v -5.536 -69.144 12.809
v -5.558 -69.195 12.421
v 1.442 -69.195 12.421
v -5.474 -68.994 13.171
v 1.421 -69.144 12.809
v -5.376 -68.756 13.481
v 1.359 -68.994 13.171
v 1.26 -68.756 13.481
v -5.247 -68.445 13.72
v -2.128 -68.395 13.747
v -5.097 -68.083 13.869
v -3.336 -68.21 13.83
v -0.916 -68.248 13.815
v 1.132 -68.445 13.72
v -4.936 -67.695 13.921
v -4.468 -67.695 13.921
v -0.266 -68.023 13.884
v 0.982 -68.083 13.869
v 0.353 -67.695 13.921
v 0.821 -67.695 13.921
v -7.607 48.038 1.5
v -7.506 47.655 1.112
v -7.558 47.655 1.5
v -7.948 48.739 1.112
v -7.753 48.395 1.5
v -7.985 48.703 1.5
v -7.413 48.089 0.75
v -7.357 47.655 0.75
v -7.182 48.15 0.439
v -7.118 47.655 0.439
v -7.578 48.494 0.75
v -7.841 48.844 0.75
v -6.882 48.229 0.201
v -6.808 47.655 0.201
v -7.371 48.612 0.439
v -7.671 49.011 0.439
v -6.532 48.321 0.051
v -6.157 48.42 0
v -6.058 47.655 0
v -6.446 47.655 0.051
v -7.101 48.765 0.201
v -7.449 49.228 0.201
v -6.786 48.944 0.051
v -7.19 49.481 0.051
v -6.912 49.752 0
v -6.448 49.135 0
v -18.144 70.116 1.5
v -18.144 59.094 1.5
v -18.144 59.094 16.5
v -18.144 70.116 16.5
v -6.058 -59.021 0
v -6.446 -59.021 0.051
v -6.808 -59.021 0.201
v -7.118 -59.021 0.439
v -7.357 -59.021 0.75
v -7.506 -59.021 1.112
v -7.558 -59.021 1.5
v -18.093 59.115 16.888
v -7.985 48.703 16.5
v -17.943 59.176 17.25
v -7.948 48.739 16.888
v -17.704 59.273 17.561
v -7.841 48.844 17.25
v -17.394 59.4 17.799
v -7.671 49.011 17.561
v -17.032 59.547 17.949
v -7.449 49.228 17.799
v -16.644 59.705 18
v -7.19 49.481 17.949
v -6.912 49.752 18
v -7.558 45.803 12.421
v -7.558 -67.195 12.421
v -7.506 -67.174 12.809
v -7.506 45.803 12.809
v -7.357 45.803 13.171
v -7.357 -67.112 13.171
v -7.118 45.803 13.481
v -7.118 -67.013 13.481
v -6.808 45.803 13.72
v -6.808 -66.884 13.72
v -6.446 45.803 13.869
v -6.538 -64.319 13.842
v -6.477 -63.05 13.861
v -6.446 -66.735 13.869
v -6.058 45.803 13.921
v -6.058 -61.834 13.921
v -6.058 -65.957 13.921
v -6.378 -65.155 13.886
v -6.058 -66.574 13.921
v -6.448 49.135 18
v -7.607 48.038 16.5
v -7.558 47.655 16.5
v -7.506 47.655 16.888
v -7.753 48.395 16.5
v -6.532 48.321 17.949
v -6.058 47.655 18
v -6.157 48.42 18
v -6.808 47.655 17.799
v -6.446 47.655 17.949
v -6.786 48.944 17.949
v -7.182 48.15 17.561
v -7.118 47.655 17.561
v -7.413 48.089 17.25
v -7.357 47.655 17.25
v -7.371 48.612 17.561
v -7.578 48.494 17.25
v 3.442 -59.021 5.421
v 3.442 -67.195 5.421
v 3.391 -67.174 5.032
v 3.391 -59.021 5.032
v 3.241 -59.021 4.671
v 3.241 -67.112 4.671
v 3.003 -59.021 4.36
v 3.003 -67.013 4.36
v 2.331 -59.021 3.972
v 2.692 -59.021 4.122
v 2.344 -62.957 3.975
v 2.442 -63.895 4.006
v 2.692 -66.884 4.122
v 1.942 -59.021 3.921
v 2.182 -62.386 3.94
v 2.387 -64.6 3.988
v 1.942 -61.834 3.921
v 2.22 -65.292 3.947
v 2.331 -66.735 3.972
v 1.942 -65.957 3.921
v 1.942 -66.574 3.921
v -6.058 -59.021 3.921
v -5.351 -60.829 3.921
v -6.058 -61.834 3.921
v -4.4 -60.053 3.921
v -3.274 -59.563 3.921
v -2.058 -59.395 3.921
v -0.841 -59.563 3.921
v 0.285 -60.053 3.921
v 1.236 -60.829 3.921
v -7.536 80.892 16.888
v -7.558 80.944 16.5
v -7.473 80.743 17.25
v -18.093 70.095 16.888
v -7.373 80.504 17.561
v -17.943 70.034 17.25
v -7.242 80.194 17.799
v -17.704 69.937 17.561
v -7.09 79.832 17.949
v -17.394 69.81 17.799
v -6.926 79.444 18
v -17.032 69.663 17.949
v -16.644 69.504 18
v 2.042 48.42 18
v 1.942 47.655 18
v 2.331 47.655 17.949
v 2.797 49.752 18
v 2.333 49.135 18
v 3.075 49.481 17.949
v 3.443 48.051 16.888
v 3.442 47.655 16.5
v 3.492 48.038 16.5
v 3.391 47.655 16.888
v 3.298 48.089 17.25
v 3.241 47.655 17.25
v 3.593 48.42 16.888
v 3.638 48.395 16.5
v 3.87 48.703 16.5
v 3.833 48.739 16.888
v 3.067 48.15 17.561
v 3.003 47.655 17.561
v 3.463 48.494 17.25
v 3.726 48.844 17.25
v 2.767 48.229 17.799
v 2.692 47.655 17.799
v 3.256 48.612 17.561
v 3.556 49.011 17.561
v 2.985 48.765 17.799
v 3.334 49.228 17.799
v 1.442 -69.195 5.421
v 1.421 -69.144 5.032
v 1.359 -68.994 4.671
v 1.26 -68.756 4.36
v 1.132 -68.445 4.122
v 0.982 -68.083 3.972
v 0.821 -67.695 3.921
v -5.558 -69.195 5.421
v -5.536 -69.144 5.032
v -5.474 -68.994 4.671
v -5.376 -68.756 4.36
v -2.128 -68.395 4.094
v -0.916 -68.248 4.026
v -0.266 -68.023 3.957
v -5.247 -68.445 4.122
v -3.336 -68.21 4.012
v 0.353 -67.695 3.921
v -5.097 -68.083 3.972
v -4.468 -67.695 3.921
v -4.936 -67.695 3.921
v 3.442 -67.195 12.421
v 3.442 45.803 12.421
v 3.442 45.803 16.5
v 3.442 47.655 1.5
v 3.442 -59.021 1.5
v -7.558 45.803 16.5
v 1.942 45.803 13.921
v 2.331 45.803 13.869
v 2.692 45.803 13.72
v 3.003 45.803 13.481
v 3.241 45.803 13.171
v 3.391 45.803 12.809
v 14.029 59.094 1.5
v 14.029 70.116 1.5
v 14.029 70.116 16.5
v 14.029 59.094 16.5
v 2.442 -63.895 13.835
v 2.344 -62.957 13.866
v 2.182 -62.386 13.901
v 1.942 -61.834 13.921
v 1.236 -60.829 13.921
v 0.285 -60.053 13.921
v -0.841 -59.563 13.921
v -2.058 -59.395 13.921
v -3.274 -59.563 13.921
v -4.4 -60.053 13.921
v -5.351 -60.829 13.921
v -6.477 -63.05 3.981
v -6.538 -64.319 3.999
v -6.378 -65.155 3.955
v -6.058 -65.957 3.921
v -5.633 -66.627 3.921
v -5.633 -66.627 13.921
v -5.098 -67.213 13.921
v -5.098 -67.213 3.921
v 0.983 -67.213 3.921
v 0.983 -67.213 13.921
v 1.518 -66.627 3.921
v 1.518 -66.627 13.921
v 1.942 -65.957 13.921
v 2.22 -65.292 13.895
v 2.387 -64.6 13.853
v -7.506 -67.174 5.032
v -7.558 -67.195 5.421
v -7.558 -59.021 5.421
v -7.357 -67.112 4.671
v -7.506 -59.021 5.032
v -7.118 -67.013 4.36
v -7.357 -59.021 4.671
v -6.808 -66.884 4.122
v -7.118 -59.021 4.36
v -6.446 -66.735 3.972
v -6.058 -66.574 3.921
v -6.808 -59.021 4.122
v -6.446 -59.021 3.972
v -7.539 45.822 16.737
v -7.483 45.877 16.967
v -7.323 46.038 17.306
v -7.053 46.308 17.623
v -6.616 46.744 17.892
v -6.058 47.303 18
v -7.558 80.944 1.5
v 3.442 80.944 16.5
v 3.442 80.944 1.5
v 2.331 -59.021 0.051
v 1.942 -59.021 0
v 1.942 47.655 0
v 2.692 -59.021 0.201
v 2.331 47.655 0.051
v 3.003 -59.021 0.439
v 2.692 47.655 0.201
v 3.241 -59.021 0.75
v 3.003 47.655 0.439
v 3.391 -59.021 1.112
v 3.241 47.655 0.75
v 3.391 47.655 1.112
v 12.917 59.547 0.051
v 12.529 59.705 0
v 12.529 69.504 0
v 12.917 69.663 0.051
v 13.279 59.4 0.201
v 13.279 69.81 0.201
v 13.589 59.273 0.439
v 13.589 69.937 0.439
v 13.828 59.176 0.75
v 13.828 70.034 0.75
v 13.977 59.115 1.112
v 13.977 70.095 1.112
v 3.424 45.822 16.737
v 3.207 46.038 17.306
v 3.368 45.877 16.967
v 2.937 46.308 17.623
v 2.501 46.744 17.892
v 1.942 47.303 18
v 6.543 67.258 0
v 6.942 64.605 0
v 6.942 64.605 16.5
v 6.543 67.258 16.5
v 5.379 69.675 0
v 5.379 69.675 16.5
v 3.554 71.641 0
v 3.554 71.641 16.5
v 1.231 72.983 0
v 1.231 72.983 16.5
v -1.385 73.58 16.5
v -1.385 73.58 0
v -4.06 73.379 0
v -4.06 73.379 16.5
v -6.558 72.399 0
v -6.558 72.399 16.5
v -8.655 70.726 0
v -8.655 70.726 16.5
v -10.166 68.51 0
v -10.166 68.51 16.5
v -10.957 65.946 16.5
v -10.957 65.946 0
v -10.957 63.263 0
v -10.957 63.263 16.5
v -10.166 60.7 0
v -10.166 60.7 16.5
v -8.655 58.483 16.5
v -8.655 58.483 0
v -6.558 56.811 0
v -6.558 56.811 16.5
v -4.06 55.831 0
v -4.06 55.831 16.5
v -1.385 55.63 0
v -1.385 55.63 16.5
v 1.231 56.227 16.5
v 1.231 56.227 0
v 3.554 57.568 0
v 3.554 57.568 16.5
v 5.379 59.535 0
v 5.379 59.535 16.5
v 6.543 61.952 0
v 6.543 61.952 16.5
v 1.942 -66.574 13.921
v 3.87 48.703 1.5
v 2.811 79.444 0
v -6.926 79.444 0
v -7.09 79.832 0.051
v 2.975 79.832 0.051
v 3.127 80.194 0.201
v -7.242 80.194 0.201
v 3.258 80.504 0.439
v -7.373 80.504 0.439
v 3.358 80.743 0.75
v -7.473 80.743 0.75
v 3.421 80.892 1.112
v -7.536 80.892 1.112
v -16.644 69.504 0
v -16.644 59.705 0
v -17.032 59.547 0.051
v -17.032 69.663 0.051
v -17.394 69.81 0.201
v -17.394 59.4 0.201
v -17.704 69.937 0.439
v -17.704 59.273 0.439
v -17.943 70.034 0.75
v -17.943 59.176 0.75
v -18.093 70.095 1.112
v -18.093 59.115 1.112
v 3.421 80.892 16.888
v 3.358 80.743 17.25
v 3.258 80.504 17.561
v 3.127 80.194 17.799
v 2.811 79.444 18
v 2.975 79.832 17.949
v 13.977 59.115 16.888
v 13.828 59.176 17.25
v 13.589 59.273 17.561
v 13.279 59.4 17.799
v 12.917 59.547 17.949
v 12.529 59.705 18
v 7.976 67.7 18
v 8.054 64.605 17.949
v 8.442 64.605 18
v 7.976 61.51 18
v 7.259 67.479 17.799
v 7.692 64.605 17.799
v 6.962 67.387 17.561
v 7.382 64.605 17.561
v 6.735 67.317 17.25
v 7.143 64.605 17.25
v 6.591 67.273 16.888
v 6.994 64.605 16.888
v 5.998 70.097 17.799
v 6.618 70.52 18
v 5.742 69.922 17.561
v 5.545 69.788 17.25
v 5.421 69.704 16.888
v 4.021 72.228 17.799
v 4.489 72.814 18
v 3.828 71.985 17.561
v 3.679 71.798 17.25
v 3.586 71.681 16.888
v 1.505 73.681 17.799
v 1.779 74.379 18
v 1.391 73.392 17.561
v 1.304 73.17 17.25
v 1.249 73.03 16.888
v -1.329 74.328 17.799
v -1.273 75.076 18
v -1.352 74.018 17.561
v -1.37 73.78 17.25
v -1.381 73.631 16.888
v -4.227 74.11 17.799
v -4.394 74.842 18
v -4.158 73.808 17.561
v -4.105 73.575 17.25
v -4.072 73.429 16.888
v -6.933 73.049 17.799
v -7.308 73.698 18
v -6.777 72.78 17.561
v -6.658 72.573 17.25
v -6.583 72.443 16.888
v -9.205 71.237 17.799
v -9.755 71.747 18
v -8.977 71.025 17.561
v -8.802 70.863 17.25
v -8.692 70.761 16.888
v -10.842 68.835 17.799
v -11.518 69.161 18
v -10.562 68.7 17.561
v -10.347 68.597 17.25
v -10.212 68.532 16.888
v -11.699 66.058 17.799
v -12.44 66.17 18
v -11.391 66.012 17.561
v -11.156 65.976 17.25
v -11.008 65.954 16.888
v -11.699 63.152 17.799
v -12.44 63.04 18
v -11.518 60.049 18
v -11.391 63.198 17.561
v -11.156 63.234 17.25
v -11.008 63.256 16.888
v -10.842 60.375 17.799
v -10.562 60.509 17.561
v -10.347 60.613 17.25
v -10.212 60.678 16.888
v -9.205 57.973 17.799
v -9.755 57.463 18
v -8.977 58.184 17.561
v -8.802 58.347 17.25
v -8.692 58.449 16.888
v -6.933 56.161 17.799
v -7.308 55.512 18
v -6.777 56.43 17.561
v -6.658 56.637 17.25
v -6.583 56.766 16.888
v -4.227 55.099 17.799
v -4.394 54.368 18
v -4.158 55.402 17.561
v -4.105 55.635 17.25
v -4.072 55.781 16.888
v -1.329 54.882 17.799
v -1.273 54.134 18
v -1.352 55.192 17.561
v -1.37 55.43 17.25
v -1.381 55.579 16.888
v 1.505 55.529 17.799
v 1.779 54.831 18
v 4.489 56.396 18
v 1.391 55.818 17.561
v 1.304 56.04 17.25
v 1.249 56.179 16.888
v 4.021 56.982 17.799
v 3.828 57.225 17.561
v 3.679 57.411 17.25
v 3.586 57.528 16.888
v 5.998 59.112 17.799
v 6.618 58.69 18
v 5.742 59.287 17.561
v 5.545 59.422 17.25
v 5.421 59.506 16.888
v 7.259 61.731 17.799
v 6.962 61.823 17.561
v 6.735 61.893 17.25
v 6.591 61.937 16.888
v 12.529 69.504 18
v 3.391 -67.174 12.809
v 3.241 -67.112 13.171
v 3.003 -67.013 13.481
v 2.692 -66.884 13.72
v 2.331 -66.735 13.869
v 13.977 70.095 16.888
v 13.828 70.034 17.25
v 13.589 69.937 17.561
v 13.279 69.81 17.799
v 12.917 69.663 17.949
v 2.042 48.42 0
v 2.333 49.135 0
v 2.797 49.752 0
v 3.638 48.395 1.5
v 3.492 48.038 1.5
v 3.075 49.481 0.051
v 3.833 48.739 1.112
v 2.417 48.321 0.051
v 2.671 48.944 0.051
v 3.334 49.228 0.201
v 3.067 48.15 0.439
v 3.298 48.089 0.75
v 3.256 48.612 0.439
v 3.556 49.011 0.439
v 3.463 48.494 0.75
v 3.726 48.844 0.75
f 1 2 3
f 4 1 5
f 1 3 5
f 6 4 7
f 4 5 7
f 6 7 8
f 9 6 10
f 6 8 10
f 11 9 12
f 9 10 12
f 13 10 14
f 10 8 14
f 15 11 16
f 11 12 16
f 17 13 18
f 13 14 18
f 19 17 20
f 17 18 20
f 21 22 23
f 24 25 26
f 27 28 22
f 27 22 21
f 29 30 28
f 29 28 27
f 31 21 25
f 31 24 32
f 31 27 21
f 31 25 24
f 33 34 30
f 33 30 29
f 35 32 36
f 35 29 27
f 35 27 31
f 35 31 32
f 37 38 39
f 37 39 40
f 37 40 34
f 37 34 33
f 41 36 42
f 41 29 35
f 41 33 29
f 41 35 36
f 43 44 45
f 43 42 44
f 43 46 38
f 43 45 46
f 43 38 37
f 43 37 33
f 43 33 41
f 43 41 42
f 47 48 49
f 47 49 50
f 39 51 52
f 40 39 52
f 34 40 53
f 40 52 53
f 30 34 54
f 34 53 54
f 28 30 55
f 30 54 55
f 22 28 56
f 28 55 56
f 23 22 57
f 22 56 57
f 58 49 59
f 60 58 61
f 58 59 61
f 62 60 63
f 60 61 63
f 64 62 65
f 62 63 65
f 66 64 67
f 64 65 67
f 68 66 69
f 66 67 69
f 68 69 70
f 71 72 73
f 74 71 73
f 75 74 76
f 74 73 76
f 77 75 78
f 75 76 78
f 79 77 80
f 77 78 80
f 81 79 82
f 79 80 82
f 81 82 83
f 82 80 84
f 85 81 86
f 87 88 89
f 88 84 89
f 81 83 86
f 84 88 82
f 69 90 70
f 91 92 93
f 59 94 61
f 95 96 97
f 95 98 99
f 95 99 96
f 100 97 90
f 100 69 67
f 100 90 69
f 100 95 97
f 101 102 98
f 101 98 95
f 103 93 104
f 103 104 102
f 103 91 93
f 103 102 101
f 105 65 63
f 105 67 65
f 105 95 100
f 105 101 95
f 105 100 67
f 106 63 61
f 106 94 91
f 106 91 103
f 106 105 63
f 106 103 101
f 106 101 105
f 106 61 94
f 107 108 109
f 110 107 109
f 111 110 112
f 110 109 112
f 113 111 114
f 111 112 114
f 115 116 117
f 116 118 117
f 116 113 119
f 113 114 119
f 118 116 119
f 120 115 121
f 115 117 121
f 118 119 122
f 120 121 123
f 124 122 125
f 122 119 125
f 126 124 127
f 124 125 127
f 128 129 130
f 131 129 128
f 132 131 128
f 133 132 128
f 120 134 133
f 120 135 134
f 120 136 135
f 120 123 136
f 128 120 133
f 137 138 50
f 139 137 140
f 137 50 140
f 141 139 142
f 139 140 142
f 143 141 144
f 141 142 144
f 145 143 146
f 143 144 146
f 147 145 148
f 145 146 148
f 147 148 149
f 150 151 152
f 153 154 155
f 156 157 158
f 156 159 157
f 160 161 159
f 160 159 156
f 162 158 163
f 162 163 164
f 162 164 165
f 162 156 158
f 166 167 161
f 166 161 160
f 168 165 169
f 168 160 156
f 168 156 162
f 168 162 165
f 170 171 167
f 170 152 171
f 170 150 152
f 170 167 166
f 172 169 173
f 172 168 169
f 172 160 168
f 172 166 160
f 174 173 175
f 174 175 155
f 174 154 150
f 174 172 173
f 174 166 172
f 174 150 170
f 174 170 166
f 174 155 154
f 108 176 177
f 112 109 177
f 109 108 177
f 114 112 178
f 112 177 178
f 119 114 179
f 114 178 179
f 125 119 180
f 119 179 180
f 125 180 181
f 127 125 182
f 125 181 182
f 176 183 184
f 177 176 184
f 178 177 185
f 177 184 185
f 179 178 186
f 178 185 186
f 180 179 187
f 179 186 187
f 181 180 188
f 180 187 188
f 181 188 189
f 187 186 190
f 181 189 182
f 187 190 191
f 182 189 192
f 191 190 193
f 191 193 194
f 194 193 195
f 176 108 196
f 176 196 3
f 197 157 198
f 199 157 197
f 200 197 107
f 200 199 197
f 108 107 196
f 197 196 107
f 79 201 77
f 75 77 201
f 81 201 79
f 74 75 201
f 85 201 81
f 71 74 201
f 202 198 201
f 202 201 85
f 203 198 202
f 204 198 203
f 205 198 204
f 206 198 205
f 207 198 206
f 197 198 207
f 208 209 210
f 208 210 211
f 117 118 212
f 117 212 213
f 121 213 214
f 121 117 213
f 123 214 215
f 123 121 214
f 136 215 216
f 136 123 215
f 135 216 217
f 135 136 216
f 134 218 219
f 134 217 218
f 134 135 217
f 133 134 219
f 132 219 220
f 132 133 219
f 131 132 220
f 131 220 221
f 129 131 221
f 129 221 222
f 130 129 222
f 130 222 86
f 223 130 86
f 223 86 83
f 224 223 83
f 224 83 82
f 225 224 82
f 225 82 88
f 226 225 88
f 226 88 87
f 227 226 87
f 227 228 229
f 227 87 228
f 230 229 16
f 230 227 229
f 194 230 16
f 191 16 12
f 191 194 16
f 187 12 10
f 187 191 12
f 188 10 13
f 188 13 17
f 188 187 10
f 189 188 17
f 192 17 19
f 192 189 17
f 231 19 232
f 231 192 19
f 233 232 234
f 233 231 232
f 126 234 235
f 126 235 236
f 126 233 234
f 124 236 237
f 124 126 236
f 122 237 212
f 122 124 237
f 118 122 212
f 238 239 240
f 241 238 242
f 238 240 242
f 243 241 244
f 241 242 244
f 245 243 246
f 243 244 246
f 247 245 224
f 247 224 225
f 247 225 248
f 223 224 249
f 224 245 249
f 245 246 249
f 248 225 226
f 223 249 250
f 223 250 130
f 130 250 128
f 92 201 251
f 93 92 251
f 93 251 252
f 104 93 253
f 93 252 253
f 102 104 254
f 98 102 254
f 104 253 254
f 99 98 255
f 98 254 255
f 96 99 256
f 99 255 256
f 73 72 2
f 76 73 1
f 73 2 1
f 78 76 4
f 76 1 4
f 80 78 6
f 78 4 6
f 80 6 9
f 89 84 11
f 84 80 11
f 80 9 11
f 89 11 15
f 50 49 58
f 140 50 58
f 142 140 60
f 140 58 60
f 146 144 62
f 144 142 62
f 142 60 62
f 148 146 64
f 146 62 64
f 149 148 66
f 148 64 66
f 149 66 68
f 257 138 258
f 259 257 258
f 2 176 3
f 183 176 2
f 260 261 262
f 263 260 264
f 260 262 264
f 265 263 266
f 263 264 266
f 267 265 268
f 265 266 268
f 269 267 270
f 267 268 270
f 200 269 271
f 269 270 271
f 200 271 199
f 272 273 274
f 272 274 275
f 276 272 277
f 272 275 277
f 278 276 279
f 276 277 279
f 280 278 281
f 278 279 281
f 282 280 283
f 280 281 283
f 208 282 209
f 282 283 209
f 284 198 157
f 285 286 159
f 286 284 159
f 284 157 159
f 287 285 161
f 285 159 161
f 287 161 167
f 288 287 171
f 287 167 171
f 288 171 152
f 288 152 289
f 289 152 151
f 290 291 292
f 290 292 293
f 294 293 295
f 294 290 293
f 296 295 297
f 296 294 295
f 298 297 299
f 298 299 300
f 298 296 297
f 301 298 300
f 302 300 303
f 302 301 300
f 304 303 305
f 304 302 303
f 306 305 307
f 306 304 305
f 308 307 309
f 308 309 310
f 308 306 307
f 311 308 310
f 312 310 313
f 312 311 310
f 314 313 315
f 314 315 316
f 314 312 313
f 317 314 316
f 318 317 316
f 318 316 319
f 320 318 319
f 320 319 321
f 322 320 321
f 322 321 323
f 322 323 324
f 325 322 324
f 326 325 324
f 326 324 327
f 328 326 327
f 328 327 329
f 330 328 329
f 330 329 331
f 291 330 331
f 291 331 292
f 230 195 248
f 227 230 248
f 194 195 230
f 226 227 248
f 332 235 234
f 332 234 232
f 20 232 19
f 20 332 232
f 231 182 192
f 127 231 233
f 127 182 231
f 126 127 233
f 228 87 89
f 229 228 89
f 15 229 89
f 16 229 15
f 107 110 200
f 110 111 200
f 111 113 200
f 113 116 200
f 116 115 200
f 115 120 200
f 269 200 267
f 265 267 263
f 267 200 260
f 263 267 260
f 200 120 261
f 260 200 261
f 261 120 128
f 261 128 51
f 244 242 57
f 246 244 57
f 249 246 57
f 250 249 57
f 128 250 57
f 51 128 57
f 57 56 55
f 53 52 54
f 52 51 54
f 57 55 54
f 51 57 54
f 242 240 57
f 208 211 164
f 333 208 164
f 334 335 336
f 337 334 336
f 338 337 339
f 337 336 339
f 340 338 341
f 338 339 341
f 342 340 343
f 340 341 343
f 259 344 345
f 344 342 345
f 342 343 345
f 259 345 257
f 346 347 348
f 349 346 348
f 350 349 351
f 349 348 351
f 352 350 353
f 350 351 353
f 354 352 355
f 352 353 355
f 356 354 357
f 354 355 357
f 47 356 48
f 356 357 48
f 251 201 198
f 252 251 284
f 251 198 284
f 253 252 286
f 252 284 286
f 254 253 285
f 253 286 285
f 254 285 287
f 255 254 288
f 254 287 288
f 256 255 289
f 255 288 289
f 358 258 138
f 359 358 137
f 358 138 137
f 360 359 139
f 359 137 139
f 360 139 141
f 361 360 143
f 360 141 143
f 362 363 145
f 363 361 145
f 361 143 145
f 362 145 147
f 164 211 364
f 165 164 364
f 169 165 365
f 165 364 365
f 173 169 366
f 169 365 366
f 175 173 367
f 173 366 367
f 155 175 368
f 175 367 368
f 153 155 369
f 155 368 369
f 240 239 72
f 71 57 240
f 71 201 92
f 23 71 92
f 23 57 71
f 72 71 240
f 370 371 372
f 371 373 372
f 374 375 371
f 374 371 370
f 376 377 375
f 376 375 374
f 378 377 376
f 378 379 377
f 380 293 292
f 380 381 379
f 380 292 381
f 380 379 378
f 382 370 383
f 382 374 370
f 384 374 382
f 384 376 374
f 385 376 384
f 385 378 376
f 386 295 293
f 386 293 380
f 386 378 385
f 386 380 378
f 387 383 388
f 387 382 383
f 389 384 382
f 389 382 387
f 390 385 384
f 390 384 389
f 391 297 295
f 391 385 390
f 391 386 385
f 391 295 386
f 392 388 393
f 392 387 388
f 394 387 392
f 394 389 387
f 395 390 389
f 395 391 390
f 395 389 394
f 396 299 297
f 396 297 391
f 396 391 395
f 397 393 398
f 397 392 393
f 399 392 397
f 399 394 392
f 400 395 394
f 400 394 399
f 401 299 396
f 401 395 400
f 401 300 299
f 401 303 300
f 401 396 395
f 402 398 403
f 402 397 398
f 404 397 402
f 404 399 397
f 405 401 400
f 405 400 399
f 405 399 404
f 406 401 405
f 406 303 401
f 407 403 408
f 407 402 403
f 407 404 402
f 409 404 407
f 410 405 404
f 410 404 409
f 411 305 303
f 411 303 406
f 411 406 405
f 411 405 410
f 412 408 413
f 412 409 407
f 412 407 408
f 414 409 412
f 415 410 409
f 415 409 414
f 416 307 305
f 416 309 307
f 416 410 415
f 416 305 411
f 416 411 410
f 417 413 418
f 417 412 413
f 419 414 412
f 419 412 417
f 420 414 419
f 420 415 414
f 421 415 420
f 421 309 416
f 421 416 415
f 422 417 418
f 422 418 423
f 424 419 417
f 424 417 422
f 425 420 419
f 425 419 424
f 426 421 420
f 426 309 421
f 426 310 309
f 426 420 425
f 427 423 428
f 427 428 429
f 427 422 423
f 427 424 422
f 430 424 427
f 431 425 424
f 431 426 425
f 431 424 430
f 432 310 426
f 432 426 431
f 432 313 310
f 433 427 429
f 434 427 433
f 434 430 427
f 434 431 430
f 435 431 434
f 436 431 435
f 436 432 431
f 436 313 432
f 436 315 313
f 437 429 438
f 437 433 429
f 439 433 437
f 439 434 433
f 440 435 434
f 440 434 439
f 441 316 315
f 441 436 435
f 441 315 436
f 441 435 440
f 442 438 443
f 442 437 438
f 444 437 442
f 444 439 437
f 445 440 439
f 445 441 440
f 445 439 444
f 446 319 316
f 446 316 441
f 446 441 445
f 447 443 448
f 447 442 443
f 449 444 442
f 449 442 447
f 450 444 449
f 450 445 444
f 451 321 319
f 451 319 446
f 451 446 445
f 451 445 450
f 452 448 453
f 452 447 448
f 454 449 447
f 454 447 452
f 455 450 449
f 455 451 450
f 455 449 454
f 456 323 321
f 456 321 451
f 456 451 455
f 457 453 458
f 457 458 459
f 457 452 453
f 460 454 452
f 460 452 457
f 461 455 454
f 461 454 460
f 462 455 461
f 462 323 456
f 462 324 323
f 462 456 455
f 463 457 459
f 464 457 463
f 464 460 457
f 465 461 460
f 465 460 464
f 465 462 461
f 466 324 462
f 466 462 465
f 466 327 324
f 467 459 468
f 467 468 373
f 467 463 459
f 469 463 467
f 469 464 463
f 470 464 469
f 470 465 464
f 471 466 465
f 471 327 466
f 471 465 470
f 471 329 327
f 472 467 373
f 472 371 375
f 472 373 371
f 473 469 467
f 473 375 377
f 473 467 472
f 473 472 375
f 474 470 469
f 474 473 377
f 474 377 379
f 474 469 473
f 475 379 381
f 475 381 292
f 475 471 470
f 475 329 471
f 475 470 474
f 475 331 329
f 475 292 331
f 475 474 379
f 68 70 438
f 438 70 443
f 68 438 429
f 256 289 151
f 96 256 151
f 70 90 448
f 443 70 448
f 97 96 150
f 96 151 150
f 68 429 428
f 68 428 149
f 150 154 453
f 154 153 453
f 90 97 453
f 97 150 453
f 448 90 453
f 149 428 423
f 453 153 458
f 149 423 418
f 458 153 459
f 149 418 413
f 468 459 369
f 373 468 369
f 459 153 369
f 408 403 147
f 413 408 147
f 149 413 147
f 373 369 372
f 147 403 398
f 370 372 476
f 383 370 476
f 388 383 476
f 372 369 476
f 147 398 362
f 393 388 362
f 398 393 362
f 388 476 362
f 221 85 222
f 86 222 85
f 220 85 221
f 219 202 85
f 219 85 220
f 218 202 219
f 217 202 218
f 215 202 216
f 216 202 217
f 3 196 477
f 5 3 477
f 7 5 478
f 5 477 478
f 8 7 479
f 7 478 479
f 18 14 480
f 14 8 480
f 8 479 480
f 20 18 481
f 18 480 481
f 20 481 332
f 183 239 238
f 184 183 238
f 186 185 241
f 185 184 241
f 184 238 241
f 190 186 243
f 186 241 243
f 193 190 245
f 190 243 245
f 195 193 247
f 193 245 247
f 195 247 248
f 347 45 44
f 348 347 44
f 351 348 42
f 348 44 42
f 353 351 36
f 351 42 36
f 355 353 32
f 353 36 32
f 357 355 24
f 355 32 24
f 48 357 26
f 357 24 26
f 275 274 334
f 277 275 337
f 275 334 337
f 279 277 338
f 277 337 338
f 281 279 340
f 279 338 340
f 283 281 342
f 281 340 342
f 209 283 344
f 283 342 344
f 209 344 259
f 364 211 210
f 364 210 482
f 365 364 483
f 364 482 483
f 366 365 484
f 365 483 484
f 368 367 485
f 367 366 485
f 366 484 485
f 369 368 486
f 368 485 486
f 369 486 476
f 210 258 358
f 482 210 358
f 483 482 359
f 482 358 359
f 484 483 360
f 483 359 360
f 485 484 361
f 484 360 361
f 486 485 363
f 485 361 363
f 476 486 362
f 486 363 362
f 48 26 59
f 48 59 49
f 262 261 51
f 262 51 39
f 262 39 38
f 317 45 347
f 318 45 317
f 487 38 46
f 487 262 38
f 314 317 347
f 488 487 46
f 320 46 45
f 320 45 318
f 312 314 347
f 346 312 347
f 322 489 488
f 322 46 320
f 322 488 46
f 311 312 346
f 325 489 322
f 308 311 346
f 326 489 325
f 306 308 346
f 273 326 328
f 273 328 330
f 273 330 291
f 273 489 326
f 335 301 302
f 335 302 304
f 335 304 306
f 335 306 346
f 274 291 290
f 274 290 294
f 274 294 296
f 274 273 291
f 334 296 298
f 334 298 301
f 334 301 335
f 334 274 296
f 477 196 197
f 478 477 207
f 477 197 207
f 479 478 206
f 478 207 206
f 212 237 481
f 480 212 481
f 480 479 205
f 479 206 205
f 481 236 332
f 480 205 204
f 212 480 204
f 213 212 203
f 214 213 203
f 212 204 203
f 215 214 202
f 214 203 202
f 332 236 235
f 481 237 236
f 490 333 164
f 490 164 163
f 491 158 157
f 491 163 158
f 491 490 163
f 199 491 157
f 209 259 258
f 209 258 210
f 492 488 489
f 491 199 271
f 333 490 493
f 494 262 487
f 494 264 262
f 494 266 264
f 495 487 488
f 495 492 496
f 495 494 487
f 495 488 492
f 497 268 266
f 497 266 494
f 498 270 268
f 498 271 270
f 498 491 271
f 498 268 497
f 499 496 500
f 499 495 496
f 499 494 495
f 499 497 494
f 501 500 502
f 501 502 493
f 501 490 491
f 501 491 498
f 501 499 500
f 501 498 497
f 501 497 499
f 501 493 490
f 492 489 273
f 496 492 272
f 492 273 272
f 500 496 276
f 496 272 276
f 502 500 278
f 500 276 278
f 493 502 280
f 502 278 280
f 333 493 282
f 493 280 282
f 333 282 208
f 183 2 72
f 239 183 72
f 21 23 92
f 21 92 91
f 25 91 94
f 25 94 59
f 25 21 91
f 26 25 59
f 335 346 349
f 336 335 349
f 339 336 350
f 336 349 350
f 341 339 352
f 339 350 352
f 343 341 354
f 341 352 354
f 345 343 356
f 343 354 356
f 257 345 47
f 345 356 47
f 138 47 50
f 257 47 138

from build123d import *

# Parameters (mm, degrees)
SKETCH1_R               = 9
SKETCH1_R_2             = 4.5
BOSS_EXTRUDE1_DEPTH     = 18
CUT_EXTRUDE1_DEPTH      = 86.684353416
CUT_EXTRUDE1_DEPTH_BACK = 86.684353416
FILLET1_R               = 1.5


with BuildPart() as part:
    # Sketch1 → Boss-Extrude1 (new body)
    with BuildSketch(Plane.XY):
        Polygon((-7.557553962, -67.195132078), (-7.557553962, 48.266235791), (-18.143619364, 59.093986602), (-18.143619364, 70.115749241), (-7.557553962, 80.943500052), (3.442446038, 80.943500052), (14.02851144, 70.115749241), (14.02851144, 59.093986602), (3.442446038, 48.266235791), (3.442446038, -67.195132078), (1.442446038, -69.195132078), (-5.557553962, -69.195132078), align=None)
        with Locations((-2.057553962, 64.604867922)):
            Circle(SKETCH1_R, mode=Mode.SUBTRACT)
        with Locations((-2.057553962, -63.895132078)):
            Circle(SKETCH1_R_2, mode=Mode.SUBTRACT)
    extrude(amount=BOSS_EXTRUDE1_DEPTH)

    # Sketch2 → Cut-Extrude1 (cut, two sides: drawn at the far end of the back side and taken through both)
    with BuildSketch(Plane.ZY.offset(7.557553962).offset(-CUT_EXTRUDE1_DEPTH_BACK)):
        Polygon((3.920552613, -84.398483755), (3.920552613, -59.021038695), (-18.582585697, -59.021038695), (-18.582585697, -119.504750135), (35.581125662, -119.504750135), (35.581125662, 45.802779434), (13.920552613, 45.802779434), (13.920552613, -84.398483755), align=None)
    extrude(amount=CUT_EXTRUDE1_DEPTH + CUT_EXTRUDE1_DEPTH_BACK, mode=Mode.SUBTRACT)

    # Fillet1
    # the kernel refuses this fillet: 1.5 mm, written as the material it adds along each edge
    with BuildSketch(Plane(origin=(3.442446038, 48.266235791, 0), x_dir=(0, -1, 0), z_dir=(0, 0, 1))) as fillet1_piece_1:
        with BuildLine():
            CenterArc((FILLET1_R * 0.407617755976, FILLET1_R), FILLET1_R, 225.646637005, 44.353362995)
            Line((-FILLET1_R * 0.291463794008, FILLET1_R * 0.284958052649), (0, 0))
            Line((0, 0), (FILLET1_R * 0.407617755976, 0))
        make_face()
    extrude(amount=18)
    with BuildSketch(Plane(origin=(-7.557553962, 48.266235791, 0), x_dir=(0, -1, 0), z_dir=(0, 0, 1))) as fillet1_piece_2:
        with BuildLine():
            CenterArc((FILLET1_R * 0.407617755976, -FILLET1_R), FILLET1_R, 90, 44.353362995)
            Line((-FILLET1_R * 0.291463794008, -FILLET1_R * 0.284958052649), (0, 0))
            Line((0, 0), (FILLET1_R * 0.407617755976, 0))
        make_face()
    extrude(amount=18)
    # the kernel refuses this fillet: 1.5 mm, written as the material it takes off along each edge
    with BuildSketch(Plane(origin=(-18.143619364, 55.343986602, 0), x_dir=(1, 0, 0), z_dir=(0, 1, 0)), Plane(origin=(14.02851144, 73.865749241, 0), x_dir=(-1, 0, 0), z_dir=(0, -1, 0))) as fillet1_2_piece_1:
        with BuildLine():
            CenterArc((FILLET1_R, -FILLET1_R), FILLET1_R, 90, 90)
            Line((0, -FILLET1_R), (0, 0))
            Line((0, 0), (FILLET1_R, 0))
        make_face()
    extrude(amount=18.521762639, mode=Mode.SUBTRACT)
    with BuildSketch(Plane(origin=(-20.765175176, 67.434341939, 0), x_dir=(0.7150419473513874, -0.6990815499839313, 0), z_dir=(0.6990815499839312, 0.7150419473513874, 0)), Plane(origin=(0.820890226, 83.624907355, 0), x_dir=(-0.7150419473513874, -0.6990815499839313, 0), z_dir=(0.6990815499839312, -0.7150419473513874, 0))) as fillet1_2_piece_2:
        with BuildLine():
            CenterArc((FILLET1_R, -FILLET1_R), FILLET1_R, 90, 90)
            Line((0, -FILLET1_R), (0, 0))
            Line((0, 0), (FILLET1_R, 0))
        make_face()
    extrude(amount=22.642819035, mode=Mode.SUBTRACT)
    with BuildSketch(Plane(origin=(-11.307553962, 80.943500052, 0), x_dir=(0, -1, 0), z_dir=(1, 0, 0))) as fillet1_2_piece_3:
        with BuildLine():
            CenterArc((FILLET1_R, -FILLET1_R), FILLET1_R, 90, 90)
            Line((0, -FILLET1_R), (0, 0))
            Line((0, 0), (FILLET1_R, 0))
        make_face()
    extrude(amount=18.5, mode=Mode.SUBTRACT)
    with BuildSketch(Plane(origin=(16.650067253, 61.775393905, 0), x_dir=(-0.7150419473513876, 0.699081549983931, 0), z_dir=(-0.699081549983931, -0.7150419473513876, 0)), Plane(origin=(-7.984991041, 48.703431482, 0), x_dir=(0.7150419473513876, 0.699081549983931, 0), z_dir=(-0.699081549983931, 0.7150419473513876, 0))) as fillet1_2_piece_4:
        with BuildLine():
            CenterArc((FILLET1_R, -FILLET1_R), FILLET1_R, 90, 90)
            Line((0, -FILLET1_R), (0, 0))
            Line((0, 0), (FILLET1_R, 0))
        make_face()
    extrude(amount=18.281392401, mode=Mode.SUBTRACT)
    with BuildSketch(Plane(origin=(-7.557553962, -62.771038695, 0), x_dir=(0, 0, 1), z_dir=(0, 1, 0))) as fillet1_2_piece_5:
        with BuildLine():
            CenterArc((FILLET1_R, FILLET1_R), FILLET1_R, 180, 90)
            Line((0, FILLET1_R), (0, 0))
            Line((0, 0), (FILLET1_R, 0))
        make_face()
    extrude(amount=110.425847852, mode=Mode.SUBTRACT)
    with BuildSketch(Plane(origin=(16.650067253, 61.775393905, 18), x_dir=(-0.7150419473513876, 0.699081549983931, 0), z_dir=(-0.699081549983931, -0.7150419473513876, 0)), Plane(origin=(-7.984991041, 48.703431482, 18), x_dir=(0.7150419473513876, 0.699081549983931, 0), z_dir=(-0.699081549983931, 0.7150419473513876, 0))) as fillet1_2_piece_6:
        with BuildLine():
            CenterArc((FILLET1_R, FILLET1_R), FILLET1_R, 180, 90)
            Line((0, FILLET1_R), (0, 0))
            Line((0, 0), (FILLET1_R, 0))
        make_face()
    extrude(amount=18.281392401, mode=Mode.SUBTRACT)
    with BuildSketch(Plane(origin=(-2.057553962, 64.604867922, 18), x_dir=(1, 0, 0), z_dir=(0, -1, 0))) as fillet1_2_piece_7:
        with BuildLine():
            CenterArc((9 + FILLET1_R, -FILLET1_R), FILLET1_R, 90, 90)
            Line((9, -FILLET1_R), (9, 0))
            Line((9, 0), (9 + FILLET1_R, 0))
        make_face()
    revolve(axis=Axis((-2.057553962, 64.604867922, 18), (0, 0, 1)), mode=Mode.SUBTRACT)
    with BuildSketch(Plane(origin=(14.02851144, 73.865749241, 18), x_dir=(-1, 0, 0), z_dir=(0, -1, 0)), Plane(origin=(-18.143619364, 55.343986602, 18), x_dir=(1, 0, 0), z_dir=(0, 1, 0))) as fillet1_2_piece_8:
        with BuildLine():
            CenterArc((FILLET1_R, FILLET1_R), FILLET1_R, 180, 90)
            Line((0, FILLET1_R), (0, 0))
            Line((0, 0), (FILLET1_R, 0))
        make_face()
    extrude(amount=18.521762639, mode=Mode.SUBTRACT)
    with BuildSketch(Plane(origin=(0.820890226, 83.624907355, 18), x_dir=(-0.7150419473513874, -0.6990815499839313, 0), z_dir=(0.6990815499839312, -0.7150419473513874, 0)), Plane(origin=(-20.765175176, 67.434341939, 18), x_dir=(0.7150419473513874, -0.6990815499839313, 0), z_dir=(0.6990815499839312, 0.7150419473513874, 0))) as fillet1_2_piece_9:
        with BuildLine():
            CenterArc((FILLET1_R, FILLET1_R), FILLET1_R, 180, 90)
            Line((0, FILLET1_R), (0, 0))
            Line((0, 0), (FILLET1_R, 0))
        make_face()
    extrude(amount=22.642819035, mode=Mode.SUBTRACT)
    with BuildSketch(Plane(origin=(-11.307553962, 80.943500052, 18), x_dir=(0, -1, 0), z_dir=(1, 0, 0)), Plane(origin=(7.192446038, 45.802779434, 18), x_dir=(0, 1, 0), z_dir=(-1, 0, 0))) as fillet1_2_piece_10:
        with BuildLine():
            CenterArc((FILLET1_R, FILLET1_R), FILLET1_R, 180, 90)
            Line((0, FILLET1_R), (0, 0))
            Line((0, 0), (FILLET1_R, 0))
        make_face()
    extrude(amount=18.5, mode=Mode.SUBTRACT)
    with BuildSketch(Plane(origin=(3.442446038, 47.654809157, 0), x_dir=(-1, 0, 0), z_dir=(0, -1, 0))) as fillet1_2_piece_11:
        with BuildLine():
            CenterArc((FILLET1_R, -FILLET1_R), FILLET1_R, 90, 90)
            Line((0, -FILLET1_R), (0, 0))
            Line((0, 0), (FILLET1_R, 0))
        make_face()
    extrude(amount=110.425847852, mode=Mode.SUBTRACT)
    with BuildSketch(Plane(origin=(3.442446038, 47.654809157, 18), x_dir=(-1, 0, 0), z_dir=(0, -1, 0))) as fillet1_2_piece_12:
        with BuildLine():
            CenterArc((FILLET1_R, FILLET1_R), FILLET1_R, 180, 90)
            Line((0, FILLET1_R), (0, 0))
            Line((0, 0), (FILLET1_R, 0))
        make_face()
    extrude(amount=5.602029724, mode=Mode.SUBTRACT)
    with BuildSketch(Plane(origin=(-2.905903532, -71.846782508, 13.920552613), x_dir=(0.7071067811865479, 0.707106781186547, 0), z_dir=(-0.7071067811865471, 0.707106781186548, 0)), Plane(origin=(6.094096468, -64.543481649, 13.920552613), x_dir=(-0.7071067811865501, 0.7071067811865448, 0), z_dir=(-0.7071067811865448, -0.7071067811865502, 0)), Plane(origin=(-1.209204391, -71.846782508, 3.920552613), x_dir=(-0.7071067811865502, 0.7071067811865449, 0), z_dir=(0.7071067811865448, 0.7071067811865502, 0))) as fillet1_2_piece_13:
        with BuildLine():
            CenterArc((FILLET1_R, FILLET1_R), FILLET1_R, 180, 90)
            Line((0, FILLET1_R), (0, 0))
            Line((0, 0), (FILLET1_R, 0))
        make_face()
    extrude(amount=10.328427125, mode=Mode.SUBTRACT)
    with BuildSketch(Plane(origin=(-7.557553962, -70.945132078, 13.920552613), x_dir=(0, 0, -1), z_dir=(0, 1, 0))) as fillet1_2_piece_14:
        with BuildLine():
            CenterArc((FILLET1_R, -FILLET1_R), FILLET1_R, 90, 90)
            Line((0, -FILLET1_R), (0, 0))
            Line((0, 0), (FILLET1_R, 0))
        make_face()
    extrude(amount=116.747911512, mode=Mode.SUBTRACT)
    with BuildSketch(Plane(origin=(3.442446038, 45.802779434, 13.920552613), x_dir=(-1, 0, 0), z_dir=(0, -1, 0))) as fillet1_2_piece_15:
        with BuildLine():
            CenterArc((FILLET1_R, FILLET1_R), FILLET1_R, 180, 90)
            Line((0, FILLET1_R), (0, 0))
            Line((0, 0), (FILLET1_R, 0))
        make_face()
    extrude(amount=116.747911512, mode=Mode.SUBTRACT)
    with BuildSketch(Plane(origin=(5.192446038, -69.195132078, 13.920552613), x_dir=(0, 1, 0), z_dir=(-1, 0, 0)), Plane(origin=(-9.307553962, -69.195132078, 3.920552613), x_dir=(0, 1, 0), z_dir=(1, 0, 0))) as fillet1_2_piece_16:
        with BuildLine():
            CenterArc((FILLET1_R, FILLET1_R), FILLET1_R, 180, 90)
            Line((0, FILLET1_R), (0, 0))
            Line((0, 0), (FILLET1_R, 0))
        make_face()
    extrude(amount=14.5, mode=Mode.SUBTRACT)
    with BuildSketch(Plane(origin=(-7.557553962, -59.021038695, 3.920552613), x_dir=(0, 0, 1), z_dir=(0, -1, 0))) as fillet1_2_piece_17:
        with BuildLine():
            CenterArc((FILLET1_R, -FILLET1_R), FILLET1_R, 90, 90)
            Line((0, -FILLET1_R), (0, 0))
            Line((0, 0), (FILLET1_R, 0))
        make_face()
    extrude(amount=11.924093383, mode=Mode.SUBTRACT)
    with BuildSketch(Plane(origin=(-10.209204391, -64.543481649, 3.920552613), x_dir=(0, 0, 1), z_dir=(0.7071067811865471, -0.707106781186548, 0))) as fillet1_2_piece_18:
        with BuildLine():
            CenterArc((FILLET1_R, -FILLET1_R), FILLET1_R, 90, 90)
            Line((0, -FILLET1_R), (0, 0))
            Line((0, 0), (FILLET1_R, 0))
        make_face()
    extrude(amount=10.328427125, mode=Mode.SUBTRACT)
    with BuildSketch(Plane(origin=(3.442446038, -70.945132078, 3.920552613), x_dir=(-1, 0, 0), z_dir=(0, 1, 0))) as fillet1_2_piece_19:
        with BuildLine():
            CenterArc((FILLET1_R, FILLET1_R), FILLET1_R, 180, 90)
            Line((0, FILLET1_R), (0, 0))
            Line((0, 0), (FILLET1_R, 0))
        make_face()
    extrude(amount=11.924093383, mode=Mode.SUBTRACT)
    with BuildSketch(Plane(origin=(-7.557553962, 42.052779434, 18), x_dir=(0, 0, -1), z_dir=(0, 1, 0))) as fillet1_2_piece_20:
        with BuildLine():
            CenterArc((FILLET1_R, -FILLET1_R), FILLET1_R, 90, 90)
            Line((0, -FILLET1_R), (0, 0))
            Line((0, 0), (FILLET1_R, 0))
        make_face()
    extrude(amount=5.602029724, mode=Mode.SUBTRACT)
    with BuildSketch(Plane(origin=(-9.057553962, 47.654809157, 18), x_dir=(1, 0, 0), z_dir=(0, -1, 0))) as fillet1_2_piece_21:
        with BuildLine():
            CenterArc((1.5 + FILLET1_R, -FILLET1_R), FILLET1_R, 90, 90)
            Line((1.5 + FILLET1_R, 0), (1.5, 0))
            Line((1.5, 0), (1.5, -FILLET1_R))
        make_face()
    revolve(axis=Axis((-9.057553962, 47.654809157, 18), (0, 0, 1)), revolution_arc=44.353362995, mode=Mode.SUBTRACT)
    with BuildSketch(Plane(origin=(4.942446038, 47.654809157, 18), x_dir=(-1, 0, 0), z_dir=(0, -1, 0))) as fillet1_2_piece_22:
        with BuildLine():
            CenterArc((1.5 + FILLET1_R, FILLET1_R), FILLET1_R, 180, 90)
            Line((1.5, FILLET1_R), (1.5, 0))
            Line((1.5, 0), (1.5 + FILLET1_R, 0))
        make_face()
    revolve(axis=Axis((4.942446038, 47.654809157, 18), (0, 0, -1)), revolution_arc=44.353362995, mode=Mode.SUBTRACT)
    with BuildSketch(Plane(origin=(4.942446038, 47.654809157, 0), x_dir=(-1, 0, 0), z_dir=(0, -1, 0))) as fillet1_2_piece_23:
        with BuildLine():
            CenterArc((1.5 + FILLET1_R, -FILLET1_R), FILLET1_R, 90, 90)
            Line((1.5, -FILLET1_R), (1.5, 0))
            Line((1.5, 0), (1.5 + FILLET1_R, 0))
        make_face()
    revolve(axis=Axis((4.942446038, 47.654809157, 0), (0, 0, -1)), revolution_arc=44.353362995, mode=Mode.SUBTRACT)
    with BuildSketch(Plane(origin=(-9.057553962, 47.654809157, 0), x_dir=(1, 0, 0), z_dir=(0, -1, 0))) as fillet1_2_piece_24:
        with BuildLine():
            CenterArc((1.5 + FILLET1_R, FILLET1_R), FILLET1_R, 180, 90)
            Line((1.5, FILLET1_R), (1.5, 0))
            Line((1.5, 0), (1.5 + FILLET1_R, 0))
        make_face()
    revolve(axis=Axis((-9.057553962, 47.654809157, 0), (0, 0, 1)), revolution_arc=44.353362995, mode=Mode.SUBTRACT)


solid = part.part
